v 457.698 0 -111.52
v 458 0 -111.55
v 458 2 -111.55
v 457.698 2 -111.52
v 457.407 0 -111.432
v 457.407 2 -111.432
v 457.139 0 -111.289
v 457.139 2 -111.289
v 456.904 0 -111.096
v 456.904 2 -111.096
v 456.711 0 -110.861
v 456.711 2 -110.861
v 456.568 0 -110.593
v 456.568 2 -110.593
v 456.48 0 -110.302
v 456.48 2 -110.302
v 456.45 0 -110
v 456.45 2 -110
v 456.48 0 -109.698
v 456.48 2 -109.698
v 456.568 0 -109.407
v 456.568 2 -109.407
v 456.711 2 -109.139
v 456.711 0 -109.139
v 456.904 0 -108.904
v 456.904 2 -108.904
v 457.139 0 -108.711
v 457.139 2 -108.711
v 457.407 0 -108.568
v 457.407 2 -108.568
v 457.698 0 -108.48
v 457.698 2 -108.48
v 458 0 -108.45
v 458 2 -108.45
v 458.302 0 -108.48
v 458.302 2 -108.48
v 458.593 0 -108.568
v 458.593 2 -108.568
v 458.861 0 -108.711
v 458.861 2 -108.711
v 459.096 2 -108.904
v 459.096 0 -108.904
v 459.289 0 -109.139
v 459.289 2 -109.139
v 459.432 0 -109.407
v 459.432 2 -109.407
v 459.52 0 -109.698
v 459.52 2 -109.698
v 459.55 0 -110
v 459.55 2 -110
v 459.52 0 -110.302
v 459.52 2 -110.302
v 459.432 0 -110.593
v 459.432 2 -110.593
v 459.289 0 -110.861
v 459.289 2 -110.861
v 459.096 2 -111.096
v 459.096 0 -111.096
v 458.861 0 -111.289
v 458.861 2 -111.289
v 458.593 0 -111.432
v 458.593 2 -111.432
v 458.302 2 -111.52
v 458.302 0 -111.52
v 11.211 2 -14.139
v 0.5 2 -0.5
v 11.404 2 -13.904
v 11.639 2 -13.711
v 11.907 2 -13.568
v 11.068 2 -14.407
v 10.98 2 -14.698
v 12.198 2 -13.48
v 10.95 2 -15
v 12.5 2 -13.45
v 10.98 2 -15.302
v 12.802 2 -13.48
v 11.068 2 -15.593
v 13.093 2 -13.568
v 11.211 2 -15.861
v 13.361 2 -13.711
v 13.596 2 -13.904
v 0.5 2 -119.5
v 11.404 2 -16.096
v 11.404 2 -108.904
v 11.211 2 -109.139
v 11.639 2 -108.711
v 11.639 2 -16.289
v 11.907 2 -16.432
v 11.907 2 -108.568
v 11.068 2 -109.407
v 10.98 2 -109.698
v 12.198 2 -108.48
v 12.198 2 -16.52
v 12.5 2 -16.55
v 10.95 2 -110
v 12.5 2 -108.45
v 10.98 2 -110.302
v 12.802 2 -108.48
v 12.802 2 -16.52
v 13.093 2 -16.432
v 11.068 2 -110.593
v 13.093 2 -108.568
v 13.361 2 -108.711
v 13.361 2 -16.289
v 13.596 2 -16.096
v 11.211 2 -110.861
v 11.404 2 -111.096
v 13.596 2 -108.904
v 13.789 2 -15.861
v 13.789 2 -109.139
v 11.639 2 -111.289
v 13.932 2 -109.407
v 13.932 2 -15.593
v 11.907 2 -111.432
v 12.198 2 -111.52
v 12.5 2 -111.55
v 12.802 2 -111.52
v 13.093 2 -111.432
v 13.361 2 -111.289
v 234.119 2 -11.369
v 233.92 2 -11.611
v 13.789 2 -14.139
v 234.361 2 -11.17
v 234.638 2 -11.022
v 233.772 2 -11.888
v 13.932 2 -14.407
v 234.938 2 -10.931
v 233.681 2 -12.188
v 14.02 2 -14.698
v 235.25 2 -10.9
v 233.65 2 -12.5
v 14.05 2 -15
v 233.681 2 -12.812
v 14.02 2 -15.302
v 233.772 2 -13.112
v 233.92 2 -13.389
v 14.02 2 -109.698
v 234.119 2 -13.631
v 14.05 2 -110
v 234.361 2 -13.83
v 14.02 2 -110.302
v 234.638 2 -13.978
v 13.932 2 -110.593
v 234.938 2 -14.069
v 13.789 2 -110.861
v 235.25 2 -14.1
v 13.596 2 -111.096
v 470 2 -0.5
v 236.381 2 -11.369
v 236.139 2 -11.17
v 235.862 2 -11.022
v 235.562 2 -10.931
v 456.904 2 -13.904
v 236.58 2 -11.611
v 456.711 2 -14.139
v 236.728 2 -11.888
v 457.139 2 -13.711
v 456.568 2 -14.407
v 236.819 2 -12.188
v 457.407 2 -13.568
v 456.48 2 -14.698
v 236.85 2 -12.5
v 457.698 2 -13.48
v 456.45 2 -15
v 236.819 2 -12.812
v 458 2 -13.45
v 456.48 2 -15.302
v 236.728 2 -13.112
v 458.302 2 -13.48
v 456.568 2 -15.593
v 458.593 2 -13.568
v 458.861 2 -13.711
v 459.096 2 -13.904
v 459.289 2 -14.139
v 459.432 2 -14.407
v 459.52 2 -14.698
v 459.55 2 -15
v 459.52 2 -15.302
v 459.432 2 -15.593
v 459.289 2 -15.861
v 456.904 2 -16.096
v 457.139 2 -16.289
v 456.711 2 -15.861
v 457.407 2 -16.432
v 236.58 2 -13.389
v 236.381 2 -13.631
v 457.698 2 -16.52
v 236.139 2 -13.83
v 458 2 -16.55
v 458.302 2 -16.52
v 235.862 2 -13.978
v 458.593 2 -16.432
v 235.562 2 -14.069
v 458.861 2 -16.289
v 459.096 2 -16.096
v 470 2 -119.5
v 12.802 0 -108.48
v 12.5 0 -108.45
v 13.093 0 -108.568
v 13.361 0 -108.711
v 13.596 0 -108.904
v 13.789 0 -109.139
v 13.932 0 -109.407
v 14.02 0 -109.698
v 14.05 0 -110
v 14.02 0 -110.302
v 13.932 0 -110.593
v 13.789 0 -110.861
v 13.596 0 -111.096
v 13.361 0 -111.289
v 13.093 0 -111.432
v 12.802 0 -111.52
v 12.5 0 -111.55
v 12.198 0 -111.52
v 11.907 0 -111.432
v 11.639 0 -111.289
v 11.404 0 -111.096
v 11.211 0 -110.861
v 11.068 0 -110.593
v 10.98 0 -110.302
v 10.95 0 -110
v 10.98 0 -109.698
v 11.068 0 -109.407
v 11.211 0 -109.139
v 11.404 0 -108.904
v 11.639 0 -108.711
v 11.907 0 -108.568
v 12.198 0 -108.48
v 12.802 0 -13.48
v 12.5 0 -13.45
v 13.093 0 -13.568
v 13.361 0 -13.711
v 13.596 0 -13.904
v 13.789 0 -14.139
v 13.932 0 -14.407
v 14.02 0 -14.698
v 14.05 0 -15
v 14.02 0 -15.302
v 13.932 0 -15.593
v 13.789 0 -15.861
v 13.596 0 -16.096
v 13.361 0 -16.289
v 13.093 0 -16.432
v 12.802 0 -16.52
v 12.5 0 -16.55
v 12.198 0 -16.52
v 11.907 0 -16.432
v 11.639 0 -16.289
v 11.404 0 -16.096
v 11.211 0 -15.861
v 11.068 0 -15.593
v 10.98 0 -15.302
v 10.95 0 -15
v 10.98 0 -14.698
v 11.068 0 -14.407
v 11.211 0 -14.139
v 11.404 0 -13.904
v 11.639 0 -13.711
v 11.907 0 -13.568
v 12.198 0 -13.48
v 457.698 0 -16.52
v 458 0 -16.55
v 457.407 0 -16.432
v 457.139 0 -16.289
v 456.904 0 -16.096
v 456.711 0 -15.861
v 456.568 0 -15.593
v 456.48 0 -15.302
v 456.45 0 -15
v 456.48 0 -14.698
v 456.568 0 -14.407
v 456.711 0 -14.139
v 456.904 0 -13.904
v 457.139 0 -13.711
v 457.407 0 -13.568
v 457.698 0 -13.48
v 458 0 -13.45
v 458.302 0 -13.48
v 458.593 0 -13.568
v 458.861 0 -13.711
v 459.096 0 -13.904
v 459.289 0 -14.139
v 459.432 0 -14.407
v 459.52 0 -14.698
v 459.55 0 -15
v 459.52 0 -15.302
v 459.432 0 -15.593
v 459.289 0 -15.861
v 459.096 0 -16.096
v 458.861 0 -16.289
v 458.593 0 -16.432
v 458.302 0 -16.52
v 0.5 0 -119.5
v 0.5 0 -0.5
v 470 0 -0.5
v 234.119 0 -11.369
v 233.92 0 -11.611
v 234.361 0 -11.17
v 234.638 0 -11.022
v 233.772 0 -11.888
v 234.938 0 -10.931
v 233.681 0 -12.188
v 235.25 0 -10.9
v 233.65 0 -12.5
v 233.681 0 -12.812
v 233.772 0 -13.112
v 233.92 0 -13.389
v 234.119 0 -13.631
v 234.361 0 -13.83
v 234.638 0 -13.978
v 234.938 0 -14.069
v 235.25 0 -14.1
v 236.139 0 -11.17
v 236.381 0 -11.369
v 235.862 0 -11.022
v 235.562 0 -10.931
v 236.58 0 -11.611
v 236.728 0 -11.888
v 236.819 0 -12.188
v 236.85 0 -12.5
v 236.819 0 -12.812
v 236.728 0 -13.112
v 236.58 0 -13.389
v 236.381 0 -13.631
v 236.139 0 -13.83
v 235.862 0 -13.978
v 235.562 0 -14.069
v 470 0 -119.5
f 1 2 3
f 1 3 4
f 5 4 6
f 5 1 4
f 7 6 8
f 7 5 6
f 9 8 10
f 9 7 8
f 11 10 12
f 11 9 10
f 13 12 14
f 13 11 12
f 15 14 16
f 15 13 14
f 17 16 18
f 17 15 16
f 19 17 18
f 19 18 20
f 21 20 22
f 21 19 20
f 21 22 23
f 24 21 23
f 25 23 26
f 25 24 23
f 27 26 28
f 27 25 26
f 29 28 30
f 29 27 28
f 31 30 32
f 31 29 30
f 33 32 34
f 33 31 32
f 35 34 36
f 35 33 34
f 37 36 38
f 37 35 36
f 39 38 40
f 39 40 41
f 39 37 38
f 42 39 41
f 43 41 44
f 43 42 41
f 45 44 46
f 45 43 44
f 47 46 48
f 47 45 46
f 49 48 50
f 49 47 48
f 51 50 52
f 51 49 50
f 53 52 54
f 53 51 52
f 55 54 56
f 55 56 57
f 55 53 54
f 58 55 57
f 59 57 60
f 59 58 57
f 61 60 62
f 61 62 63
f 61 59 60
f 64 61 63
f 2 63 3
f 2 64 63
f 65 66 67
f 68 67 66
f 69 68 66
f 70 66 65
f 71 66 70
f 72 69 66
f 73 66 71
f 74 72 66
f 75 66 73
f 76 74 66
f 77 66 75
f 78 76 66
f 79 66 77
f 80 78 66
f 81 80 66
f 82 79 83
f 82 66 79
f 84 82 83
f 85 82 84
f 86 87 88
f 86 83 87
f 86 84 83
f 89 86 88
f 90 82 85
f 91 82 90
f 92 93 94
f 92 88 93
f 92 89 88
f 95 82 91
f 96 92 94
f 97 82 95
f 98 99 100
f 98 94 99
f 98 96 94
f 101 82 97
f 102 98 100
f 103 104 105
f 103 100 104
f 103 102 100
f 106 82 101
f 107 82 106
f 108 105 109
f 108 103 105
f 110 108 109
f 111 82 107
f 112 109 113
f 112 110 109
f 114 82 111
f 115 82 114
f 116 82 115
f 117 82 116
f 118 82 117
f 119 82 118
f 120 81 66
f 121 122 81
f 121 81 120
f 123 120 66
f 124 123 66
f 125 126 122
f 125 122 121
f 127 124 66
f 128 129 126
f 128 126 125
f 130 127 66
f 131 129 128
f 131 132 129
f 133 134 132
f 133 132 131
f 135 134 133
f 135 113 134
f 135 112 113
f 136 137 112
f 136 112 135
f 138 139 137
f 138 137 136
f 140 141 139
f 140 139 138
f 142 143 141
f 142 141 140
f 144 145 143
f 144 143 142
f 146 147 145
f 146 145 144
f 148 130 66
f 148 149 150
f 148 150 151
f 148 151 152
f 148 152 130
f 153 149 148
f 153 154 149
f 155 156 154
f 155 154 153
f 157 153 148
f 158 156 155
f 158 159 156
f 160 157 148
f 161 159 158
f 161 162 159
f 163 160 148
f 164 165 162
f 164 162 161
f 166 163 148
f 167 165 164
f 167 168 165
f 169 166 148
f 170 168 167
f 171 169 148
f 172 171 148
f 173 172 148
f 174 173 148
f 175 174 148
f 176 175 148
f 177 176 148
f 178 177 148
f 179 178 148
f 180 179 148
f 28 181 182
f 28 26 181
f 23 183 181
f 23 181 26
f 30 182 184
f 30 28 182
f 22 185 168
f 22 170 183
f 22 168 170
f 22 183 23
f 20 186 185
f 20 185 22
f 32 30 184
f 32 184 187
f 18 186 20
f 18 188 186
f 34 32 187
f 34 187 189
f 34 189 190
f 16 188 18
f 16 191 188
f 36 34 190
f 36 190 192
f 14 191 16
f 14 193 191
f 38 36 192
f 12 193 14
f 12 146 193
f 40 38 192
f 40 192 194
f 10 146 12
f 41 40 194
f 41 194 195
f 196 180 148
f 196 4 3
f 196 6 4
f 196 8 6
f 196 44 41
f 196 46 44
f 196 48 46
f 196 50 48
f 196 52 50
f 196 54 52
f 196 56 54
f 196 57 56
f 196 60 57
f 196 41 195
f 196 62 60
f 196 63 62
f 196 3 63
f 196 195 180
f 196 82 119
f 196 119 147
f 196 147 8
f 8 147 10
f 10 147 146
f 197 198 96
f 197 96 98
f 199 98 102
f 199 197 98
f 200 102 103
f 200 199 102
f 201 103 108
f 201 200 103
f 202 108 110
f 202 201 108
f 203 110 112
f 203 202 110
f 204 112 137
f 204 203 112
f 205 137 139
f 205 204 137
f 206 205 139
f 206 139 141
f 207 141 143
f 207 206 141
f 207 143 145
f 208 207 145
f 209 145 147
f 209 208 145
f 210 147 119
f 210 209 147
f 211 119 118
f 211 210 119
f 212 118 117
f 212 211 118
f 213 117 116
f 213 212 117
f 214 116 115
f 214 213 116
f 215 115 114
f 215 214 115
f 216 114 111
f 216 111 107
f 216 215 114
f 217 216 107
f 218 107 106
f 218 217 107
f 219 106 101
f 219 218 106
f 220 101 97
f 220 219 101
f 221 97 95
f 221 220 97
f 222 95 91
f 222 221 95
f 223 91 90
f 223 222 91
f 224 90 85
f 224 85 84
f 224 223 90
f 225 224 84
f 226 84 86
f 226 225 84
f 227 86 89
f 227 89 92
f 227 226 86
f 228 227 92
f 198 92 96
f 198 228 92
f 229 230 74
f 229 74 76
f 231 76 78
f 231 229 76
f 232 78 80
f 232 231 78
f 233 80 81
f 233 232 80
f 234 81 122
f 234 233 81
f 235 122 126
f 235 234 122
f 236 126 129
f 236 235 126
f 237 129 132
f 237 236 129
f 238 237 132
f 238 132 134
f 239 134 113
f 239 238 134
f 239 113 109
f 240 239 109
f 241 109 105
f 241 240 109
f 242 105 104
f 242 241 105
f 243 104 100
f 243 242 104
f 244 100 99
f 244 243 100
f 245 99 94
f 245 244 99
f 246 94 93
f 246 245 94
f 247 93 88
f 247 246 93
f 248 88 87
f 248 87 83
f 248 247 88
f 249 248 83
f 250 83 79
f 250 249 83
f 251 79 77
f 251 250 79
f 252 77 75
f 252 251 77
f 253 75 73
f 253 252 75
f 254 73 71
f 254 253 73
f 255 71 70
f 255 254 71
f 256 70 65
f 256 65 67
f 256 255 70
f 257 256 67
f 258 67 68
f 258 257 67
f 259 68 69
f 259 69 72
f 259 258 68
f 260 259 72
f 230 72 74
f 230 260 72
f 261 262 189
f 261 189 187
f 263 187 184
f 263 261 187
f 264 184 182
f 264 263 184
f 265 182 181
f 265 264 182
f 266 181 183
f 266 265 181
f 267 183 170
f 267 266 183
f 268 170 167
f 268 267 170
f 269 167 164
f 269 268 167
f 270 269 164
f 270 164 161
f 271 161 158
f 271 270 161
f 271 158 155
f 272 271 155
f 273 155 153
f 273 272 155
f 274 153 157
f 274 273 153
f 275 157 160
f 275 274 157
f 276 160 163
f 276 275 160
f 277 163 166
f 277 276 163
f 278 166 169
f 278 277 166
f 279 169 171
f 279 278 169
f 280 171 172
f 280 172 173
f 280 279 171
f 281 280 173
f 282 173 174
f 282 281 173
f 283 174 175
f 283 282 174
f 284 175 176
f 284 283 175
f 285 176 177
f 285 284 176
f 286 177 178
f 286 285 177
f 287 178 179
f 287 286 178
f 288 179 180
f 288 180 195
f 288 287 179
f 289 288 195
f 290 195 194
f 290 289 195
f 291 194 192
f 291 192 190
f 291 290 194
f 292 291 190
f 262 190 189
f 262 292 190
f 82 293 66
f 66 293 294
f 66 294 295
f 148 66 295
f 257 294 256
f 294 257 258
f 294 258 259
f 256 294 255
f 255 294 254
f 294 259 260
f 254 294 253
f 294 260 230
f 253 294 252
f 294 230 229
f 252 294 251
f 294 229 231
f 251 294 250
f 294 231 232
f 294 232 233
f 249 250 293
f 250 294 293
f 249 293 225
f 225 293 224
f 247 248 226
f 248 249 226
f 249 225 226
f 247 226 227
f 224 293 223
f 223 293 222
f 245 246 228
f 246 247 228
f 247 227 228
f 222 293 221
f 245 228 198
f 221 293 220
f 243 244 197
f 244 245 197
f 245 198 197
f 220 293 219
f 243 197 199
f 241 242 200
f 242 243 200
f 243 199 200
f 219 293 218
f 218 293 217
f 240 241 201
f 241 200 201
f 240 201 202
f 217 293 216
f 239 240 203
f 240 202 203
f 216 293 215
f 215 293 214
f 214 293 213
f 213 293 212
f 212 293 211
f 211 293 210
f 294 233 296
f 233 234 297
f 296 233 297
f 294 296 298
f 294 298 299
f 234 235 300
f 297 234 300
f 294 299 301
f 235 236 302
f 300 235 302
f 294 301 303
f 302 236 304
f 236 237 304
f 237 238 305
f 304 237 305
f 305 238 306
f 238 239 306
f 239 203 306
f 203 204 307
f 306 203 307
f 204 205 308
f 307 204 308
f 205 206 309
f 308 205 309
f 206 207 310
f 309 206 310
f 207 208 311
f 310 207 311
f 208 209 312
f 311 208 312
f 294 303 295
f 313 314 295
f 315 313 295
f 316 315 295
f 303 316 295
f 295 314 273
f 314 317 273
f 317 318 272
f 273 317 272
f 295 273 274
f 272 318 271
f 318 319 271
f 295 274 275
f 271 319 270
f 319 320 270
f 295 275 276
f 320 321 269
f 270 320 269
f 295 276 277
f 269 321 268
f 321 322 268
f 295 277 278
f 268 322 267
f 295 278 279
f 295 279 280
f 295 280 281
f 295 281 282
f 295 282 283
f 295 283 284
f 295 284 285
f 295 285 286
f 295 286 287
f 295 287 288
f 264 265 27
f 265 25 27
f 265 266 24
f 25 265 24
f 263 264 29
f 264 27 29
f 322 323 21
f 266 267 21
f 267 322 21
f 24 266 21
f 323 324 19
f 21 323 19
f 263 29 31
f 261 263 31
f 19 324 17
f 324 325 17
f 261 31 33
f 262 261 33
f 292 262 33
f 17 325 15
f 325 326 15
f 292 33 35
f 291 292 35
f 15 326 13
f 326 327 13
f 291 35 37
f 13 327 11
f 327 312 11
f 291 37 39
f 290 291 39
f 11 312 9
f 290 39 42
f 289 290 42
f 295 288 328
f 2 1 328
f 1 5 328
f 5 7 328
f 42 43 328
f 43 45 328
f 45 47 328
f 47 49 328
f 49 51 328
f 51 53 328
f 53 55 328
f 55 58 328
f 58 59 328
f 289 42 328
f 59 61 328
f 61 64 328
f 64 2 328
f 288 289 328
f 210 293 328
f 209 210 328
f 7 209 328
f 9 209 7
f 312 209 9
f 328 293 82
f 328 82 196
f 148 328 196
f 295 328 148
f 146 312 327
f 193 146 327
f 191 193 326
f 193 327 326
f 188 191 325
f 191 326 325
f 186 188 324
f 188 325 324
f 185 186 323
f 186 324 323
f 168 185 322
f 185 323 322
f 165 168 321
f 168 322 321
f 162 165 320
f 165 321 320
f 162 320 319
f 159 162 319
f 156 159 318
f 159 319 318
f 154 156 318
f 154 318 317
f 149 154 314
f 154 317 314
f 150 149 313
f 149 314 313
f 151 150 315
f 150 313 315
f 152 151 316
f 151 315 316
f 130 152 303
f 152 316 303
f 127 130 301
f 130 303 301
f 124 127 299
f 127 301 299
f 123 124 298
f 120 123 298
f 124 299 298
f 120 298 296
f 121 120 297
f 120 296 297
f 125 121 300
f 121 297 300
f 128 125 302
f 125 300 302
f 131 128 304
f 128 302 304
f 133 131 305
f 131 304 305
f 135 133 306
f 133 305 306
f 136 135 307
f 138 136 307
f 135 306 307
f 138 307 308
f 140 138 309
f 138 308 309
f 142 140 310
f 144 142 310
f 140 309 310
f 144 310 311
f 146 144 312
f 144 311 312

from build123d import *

# Parameters (mm, degrees)
CROQUIS1_W              = 470.5
CROQUIS1_H              = 120
CROQUIS1_R              = 1.55
SALIENTE_EXTRUIR1_DEPTH = 2
CROQUIS2_W              = 470.5
CROQUIS2_H              = 120
CROQUIS2_W_2            = 469.5
CROQUIS2_H_2            = 119
CORTAR_EXTRUIR1_DEPTH   = 2
CROQUIS3_R              = 1.6
CORTAR_EXTRUIR2_DEPTH   = 2


with BuildPart() as part:
    # Croquis1 → Saliente-Extruir1 (new body)
    with BuildSketch(Plane(origin=(0, 0, 0), x_dir=(1, 0, 0), z_dir=(0, 1, 0))):
        with Locations((235.25, 60)):
            Rectangle(CROQUIS1_W, CROQUIS1_H)
        with Locations(Location((12.5, 15, 0), (0, 0, 270))):
            Circle(CROQUIS1_R, mode=Mode.SUBTRACT)
        with Locations(Location((12.5, 110, 0), (0, 0, 270))):
            Circle(CROQUIS1_R, mode=Mode.SUBTRACT)
        with Locations(Location((458, 15, 0), (0, 0, 90))):
            Circle(CROQUIS1_R, mode=Mode.SUBTRACT)
        with Locations(Location((458, 110, 0), (0, 0, 90))):
            Circle(CROQUIS1_R, mode=Mode.SUBTRACT)
    extrude(amount=SALIENTE_EXTRUIR1_DEPTH)

    # Croquis2 → Cortar-Extruir1 (cut)
    with BuildSketch(Plane.XZ):
        with Locations((235.25, -60)):
            Rectangle(CROQUIS2_W, CROQUIS2_H)
        with Locations((235.25, -60)):
            Rectangle(CROQUIS2_W_2, CROQUIS2_H_2, mode=Mode.SUBTRACT)
    extrude(amount=-CORTAR_EXTRUIR1_DEPTH, mode=Mode.SUBTRACT)

    # Croquis3 → Cortar-Extruir2 (cut)
    with BuildSketch(Plane.XZ):
        with Locations(Location((235.25, -12.5, 0), (0, 0, 270))):
            Circle(CROQUIS3_R)
    extrude(amount=-CORTAR_EXTRUIR2_DEPTH, mode=Mode.SUBTRACT)


solid = part.part
